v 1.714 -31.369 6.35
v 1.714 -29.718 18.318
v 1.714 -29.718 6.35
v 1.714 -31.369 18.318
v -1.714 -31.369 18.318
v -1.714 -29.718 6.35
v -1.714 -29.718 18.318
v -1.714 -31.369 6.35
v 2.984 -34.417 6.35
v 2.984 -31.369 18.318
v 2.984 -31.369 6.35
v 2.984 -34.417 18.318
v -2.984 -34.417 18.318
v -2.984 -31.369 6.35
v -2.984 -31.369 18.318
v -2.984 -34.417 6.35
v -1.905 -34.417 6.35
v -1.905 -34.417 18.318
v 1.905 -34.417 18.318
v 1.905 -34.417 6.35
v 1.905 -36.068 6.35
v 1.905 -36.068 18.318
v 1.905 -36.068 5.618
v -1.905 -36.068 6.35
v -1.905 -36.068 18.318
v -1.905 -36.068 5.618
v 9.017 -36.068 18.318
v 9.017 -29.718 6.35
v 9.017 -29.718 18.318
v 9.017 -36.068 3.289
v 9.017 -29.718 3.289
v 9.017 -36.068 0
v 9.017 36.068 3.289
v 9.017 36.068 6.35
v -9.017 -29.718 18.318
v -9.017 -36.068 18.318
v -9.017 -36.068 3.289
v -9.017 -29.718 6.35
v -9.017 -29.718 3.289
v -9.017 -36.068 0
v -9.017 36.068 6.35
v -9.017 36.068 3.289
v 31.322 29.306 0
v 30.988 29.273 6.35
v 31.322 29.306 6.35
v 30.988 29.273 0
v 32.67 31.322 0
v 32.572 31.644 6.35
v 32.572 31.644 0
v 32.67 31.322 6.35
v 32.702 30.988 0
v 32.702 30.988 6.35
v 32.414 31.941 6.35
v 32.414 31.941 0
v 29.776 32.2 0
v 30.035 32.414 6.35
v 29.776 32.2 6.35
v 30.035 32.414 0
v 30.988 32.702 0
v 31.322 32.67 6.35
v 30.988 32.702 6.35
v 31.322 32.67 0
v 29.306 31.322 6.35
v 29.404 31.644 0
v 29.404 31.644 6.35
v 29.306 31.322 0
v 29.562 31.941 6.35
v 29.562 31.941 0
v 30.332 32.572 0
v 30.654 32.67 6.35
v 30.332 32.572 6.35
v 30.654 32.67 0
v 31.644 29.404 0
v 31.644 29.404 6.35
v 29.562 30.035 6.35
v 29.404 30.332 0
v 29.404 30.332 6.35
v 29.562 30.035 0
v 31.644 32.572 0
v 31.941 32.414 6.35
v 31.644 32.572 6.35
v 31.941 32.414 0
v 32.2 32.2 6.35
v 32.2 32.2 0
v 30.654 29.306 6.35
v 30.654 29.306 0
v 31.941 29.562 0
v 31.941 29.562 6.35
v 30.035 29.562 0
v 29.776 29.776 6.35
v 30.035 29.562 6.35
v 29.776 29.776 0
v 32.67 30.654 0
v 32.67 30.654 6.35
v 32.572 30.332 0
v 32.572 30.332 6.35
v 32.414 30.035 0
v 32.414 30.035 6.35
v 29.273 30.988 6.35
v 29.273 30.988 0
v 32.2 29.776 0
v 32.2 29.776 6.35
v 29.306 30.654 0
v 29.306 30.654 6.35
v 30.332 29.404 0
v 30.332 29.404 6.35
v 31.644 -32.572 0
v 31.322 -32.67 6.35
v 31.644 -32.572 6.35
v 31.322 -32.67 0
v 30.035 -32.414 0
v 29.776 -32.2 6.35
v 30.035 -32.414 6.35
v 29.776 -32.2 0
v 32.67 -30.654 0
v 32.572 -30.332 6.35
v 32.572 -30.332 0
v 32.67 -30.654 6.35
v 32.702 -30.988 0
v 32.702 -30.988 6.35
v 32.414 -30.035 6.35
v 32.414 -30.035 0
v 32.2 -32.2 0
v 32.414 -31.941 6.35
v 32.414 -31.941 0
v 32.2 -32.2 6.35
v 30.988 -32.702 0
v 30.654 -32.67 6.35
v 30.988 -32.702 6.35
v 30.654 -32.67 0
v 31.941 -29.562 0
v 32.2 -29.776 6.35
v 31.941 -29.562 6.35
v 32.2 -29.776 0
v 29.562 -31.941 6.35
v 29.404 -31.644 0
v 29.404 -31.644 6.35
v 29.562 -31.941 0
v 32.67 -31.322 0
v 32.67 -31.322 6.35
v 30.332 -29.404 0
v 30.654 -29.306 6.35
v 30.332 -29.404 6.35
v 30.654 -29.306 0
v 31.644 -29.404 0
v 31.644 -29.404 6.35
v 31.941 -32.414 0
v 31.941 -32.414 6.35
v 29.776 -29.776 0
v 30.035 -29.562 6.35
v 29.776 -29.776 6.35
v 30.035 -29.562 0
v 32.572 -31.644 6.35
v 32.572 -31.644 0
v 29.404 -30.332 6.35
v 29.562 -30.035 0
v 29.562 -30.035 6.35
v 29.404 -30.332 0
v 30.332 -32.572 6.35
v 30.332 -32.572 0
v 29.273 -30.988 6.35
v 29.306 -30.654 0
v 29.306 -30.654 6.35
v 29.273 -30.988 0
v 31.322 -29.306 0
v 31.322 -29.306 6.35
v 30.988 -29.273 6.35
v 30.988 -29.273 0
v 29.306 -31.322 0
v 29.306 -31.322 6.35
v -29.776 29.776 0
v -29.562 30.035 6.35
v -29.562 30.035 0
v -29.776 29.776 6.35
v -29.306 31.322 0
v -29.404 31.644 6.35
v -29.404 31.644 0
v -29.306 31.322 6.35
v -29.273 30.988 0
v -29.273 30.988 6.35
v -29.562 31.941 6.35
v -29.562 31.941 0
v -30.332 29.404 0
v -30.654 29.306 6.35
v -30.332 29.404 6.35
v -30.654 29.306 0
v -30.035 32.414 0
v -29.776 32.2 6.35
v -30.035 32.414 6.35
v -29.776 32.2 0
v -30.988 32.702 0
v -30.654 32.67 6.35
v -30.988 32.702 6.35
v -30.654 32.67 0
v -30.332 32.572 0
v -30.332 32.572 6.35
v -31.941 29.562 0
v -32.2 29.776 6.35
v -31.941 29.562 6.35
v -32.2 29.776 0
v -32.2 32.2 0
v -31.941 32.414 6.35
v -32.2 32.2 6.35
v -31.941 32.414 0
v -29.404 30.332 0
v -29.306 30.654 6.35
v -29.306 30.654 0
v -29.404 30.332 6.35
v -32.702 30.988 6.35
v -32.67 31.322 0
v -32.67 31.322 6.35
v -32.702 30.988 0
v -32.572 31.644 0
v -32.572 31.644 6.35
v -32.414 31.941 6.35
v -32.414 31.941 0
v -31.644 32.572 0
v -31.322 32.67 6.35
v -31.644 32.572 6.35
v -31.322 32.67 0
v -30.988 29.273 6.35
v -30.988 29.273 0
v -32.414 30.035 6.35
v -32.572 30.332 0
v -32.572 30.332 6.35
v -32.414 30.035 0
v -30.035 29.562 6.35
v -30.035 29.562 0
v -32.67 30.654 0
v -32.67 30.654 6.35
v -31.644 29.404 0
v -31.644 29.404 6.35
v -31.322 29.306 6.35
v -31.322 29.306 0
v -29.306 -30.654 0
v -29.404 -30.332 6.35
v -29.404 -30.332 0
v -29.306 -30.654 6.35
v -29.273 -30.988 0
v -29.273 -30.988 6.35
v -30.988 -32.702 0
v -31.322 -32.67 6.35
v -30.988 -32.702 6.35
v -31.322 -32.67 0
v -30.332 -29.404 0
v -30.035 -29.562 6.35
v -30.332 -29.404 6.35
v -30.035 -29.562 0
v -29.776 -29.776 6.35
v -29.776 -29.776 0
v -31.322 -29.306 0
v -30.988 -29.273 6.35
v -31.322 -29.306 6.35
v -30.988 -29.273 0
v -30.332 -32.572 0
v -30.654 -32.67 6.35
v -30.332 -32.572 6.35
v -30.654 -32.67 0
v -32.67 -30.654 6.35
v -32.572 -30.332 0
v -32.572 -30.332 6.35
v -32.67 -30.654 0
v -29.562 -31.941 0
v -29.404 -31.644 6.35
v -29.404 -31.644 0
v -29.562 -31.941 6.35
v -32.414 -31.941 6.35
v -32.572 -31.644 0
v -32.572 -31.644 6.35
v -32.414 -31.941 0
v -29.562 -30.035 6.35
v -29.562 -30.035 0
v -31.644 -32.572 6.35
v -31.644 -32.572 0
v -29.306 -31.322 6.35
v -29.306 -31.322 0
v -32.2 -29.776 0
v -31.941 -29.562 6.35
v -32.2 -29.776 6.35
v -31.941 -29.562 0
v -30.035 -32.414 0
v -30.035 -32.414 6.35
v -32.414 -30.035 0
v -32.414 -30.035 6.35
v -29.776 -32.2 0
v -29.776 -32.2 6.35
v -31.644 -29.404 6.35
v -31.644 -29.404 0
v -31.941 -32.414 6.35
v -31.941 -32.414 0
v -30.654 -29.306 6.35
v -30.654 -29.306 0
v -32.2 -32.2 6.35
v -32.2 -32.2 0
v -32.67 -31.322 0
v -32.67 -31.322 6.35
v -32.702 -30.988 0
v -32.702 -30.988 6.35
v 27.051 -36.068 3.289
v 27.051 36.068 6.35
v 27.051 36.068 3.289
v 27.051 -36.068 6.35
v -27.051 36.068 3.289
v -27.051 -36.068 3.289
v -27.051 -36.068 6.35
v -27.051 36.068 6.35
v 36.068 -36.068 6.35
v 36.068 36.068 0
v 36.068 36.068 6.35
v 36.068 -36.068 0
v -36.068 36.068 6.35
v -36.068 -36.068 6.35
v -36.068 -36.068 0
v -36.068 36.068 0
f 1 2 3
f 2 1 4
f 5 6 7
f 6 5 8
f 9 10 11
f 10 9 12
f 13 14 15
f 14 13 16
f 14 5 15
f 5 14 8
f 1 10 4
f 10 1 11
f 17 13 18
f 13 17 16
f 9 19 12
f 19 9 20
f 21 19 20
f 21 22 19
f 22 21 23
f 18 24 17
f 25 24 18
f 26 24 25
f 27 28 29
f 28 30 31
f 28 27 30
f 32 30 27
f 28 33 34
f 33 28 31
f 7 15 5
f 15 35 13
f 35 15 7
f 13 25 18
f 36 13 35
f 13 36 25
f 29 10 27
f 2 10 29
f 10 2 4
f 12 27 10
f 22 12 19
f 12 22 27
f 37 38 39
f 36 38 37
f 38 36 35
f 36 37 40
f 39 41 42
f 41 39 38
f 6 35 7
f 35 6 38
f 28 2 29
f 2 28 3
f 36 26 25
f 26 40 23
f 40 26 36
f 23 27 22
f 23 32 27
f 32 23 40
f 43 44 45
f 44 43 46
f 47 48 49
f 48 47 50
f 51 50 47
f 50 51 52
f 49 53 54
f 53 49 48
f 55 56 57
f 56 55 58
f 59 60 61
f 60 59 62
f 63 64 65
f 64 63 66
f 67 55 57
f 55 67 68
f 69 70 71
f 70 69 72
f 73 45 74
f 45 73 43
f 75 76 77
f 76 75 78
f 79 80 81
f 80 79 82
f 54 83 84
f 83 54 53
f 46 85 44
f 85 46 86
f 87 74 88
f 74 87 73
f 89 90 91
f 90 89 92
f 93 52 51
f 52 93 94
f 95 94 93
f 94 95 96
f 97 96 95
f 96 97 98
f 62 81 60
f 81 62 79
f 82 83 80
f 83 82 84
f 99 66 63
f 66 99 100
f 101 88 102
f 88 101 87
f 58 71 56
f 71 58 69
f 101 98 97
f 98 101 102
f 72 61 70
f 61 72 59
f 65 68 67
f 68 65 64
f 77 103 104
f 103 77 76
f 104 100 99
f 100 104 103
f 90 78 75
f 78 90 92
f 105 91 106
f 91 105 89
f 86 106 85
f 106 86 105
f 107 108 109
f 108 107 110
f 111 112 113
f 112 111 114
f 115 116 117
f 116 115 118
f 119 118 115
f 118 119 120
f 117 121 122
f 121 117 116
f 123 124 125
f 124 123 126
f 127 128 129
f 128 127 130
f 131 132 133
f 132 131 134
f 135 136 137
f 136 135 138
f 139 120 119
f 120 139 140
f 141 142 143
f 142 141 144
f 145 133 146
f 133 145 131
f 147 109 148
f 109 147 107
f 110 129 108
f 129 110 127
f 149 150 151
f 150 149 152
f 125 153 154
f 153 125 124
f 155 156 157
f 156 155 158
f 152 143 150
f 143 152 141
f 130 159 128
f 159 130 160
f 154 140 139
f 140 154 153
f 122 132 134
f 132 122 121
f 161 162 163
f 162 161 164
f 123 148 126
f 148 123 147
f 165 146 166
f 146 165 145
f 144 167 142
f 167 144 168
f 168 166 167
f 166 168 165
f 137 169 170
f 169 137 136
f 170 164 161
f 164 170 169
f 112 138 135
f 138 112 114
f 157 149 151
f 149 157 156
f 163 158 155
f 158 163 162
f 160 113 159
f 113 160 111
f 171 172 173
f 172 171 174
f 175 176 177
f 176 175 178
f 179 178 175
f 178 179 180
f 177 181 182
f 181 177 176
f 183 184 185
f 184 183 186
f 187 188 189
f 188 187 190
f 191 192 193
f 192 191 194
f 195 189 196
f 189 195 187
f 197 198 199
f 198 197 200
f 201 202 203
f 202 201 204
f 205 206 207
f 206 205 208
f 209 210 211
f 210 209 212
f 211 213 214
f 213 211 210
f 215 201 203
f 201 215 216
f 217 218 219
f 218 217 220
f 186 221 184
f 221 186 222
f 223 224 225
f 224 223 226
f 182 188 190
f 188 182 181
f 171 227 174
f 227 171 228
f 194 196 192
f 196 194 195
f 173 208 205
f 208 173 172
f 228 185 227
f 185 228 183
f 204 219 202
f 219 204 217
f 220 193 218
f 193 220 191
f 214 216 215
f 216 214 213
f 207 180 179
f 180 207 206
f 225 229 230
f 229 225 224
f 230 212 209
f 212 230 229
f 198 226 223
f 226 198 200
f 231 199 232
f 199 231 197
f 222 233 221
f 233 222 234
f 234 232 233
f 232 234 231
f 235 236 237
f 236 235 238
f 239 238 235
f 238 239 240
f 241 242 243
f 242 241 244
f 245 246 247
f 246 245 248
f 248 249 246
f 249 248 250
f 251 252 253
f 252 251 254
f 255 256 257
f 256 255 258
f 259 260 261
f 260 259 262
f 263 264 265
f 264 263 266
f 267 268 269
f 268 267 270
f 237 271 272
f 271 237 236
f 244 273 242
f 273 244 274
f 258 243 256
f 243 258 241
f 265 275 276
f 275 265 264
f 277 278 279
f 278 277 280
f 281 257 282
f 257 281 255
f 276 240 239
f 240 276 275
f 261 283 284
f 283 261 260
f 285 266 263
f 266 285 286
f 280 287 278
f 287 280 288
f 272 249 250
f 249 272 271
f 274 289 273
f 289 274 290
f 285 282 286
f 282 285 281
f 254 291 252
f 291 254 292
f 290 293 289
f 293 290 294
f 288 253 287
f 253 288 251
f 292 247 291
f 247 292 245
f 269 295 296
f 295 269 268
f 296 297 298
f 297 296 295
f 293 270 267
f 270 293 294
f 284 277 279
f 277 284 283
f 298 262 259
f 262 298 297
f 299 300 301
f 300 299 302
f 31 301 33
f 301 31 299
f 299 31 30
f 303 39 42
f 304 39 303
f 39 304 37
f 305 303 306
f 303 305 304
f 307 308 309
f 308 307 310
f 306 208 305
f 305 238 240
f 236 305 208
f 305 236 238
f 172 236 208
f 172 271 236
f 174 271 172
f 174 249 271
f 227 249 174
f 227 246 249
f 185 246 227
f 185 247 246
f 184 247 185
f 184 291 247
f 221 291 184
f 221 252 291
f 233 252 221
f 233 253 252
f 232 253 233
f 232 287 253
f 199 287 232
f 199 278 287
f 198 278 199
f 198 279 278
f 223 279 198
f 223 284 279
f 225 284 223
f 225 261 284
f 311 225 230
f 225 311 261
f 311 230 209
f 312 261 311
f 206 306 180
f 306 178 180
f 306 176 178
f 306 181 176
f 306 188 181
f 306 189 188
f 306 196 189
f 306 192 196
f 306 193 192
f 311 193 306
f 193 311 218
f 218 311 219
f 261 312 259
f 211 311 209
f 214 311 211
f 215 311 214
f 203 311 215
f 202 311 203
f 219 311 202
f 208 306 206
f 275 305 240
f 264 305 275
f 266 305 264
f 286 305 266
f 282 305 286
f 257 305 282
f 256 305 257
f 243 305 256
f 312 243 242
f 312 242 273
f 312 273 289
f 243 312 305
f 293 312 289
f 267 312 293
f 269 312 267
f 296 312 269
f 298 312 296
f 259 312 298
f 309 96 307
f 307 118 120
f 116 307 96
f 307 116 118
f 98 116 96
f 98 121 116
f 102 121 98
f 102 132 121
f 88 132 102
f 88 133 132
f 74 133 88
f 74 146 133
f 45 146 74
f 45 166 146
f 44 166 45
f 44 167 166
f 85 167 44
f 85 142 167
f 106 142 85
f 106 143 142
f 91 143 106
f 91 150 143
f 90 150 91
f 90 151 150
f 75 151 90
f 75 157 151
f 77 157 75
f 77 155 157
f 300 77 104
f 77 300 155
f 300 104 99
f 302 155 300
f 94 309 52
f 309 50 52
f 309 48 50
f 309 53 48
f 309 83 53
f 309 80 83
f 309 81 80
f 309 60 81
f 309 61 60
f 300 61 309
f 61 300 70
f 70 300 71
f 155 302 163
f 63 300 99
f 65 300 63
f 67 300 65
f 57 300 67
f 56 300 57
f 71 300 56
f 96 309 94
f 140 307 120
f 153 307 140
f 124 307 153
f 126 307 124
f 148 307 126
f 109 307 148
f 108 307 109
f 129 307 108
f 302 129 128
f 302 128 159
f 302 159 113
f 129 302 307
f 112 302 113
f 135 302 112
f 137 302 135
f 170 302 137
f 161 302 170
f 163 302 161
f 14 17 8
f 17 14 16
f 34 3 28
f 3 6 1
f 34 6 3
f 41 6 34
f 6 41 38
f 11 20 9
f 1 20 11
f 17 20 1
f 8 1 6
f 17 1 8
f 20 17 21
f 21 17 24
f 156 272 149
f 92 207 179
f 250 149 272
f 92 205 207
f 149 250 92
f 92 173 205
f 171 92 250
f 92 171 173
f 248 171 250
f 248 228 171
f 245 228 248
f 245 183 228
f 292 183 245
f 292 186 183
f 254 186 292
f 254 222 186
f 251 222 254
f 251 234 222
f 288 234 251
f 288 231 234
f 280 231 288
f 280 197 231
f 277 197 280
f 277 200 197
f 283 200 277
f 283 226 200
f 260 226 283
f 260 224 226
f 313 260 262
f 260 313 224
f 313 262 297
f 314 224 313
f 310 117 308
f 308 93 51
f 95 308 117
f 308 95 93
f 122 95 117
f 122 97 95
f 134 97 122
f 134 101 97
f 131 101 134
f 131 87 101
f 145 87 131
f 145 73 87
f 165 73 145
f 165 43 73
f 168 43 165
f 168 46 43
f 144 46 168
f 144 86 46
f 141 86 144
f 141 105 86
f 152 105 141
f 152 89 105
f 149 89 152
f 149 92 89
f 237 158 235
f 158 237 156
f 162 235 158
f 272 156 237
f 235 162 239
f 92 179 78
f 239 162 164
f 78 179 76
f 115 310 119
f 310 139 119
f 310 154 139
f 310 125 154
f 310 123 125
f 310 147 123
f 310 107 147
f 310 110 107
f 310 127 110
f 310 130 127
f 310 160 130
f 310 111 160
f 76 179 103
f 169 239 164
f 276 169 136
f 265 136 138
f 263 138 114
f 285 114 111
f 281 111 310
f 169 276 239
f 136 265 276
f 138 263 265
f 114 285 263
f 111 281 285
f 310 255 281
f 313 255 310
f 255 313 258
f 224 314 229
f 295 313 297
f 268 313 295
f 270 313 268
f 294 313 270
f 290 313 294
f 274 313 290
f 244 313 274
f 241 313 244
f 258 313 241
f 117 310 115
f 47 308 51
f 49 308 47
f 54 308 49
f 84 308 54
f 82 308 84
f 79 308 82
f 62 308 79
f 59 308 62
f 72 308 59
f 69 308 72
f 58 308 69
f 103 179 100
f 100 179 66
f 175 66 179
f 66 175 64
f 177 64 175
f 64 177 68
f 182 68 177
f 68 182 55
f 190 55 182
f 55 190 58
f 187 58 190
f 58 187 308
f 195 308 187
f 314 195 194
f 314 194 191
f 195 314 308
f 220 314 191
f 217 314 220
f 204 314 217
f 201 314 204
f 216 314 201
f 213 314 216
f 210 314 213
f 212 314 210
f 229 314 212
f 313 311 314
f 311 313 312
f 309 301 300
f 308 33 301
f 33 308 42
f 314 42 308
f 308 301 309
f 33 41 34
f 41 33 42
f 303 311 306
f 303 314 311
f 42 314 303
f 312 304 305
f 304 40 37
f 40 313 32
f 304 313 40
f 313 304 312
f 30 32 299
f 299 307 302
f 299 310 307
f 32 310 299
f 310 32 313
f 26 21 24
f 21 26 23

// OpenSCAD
// file: Common.scad
// All dimensions in inches


$fn=32;

FlaviaOH = 0.185;
FlaviaIH = 0.11;
FlaviaOW = 0.71;
FlaviaIW = 0.55;
FlaviaSlotW = 0.27;
FlaviaMatThick = 0.032;

BaseT = 0.25;
BaseW = FlaviaOW * 4;
// for Test
// BaseL = 0.5;
BaseL = BaseW;



RiserW = BaseW * 0.25;
RiserD = 0.25;
RiserScrewHole = 0.135; // oversize for 0.1285

RiserScrewSlotW = 0.2;
RiserScrewSlotD = 0.2;
RiserScrewHeadDia = 0.25; // panhead 

SlotZ = BaseT - FlaviaOH + FlaviaMatThick;   

TeeH = 1.2 * FlaviaOH; // just to say

// When sitting in slide
SlideHeight = SlotZ + FlaviaMatThick + TeeH + BaseT;
RiserH = SlideHeight * 1.2;
RiserLeadScrewCenter = RiserH - (BaseT * 0.5);
SlideLeadScrewCenter = SlideHeight - (SlotZ + FlaviaMatThick) - (BaseT * 0.5);

SlotSp = FlaviaOW;

// remembering that everything is in inches.  (how embarassing)

Smidge = 0.025; // nearest metric is 0.6 mm.

// The original design said this: 
//   captive nuts need to be a tight (interference) fit in the
//   slot, as the difference between the longest and shortest chord
//   can be quite small (0.030 in the case of a 4-40 nut)
//   Both slot widths will be tight and require an "arbor press."
//   In the absence of an arbor press, one may use a thumb and a
//   coin.
//
// The original design was broken.
//
//   The captive nuts need to float a bit.  The pocket "depth" should
// be a little loose, even though we pay for this with a bit of lash.
//
//   Additionally, the screw head floats in a slot. This allows some
// freedom to align the screw in the base slot with the hole in the slide.
// Dimensional tolerances make lining up the holes between the base riser
// block and the slide platform difficult and fragile.  Small changes in
// printer resolution or the phase of the moon can cause the two holes
// not to line up.  So, the head floats.
// 
NutPocketW4_40 = 0.240;  // captive nut "dia" for 4-40 nut
NutPocketWM3 = 0.210;    // captive nut "dia" for M3 nut

NutPocketDepth = 0.095 + Smidge;

// In places where we need a little bit of play,
// this is our delta 


// The head slot widths need to be just a bit oversized,
// as we'd like most of the friction to be in the anti-lash
// part of the slot.
HeadSlot4_40 = 0.225 + Smidge; // head dia for 4-40 pan head
HeadSlotM3 = 0.21 + Smidge; // head dia for M3 cap screw

// This needs to be a little snug, but not tight.
// The difference in fit amounts to the lash in the
// system.  In general, I'd rather not care, and require
// "one direction only" movement of the slide.  But
// one should never foreclose opportunities for redemption
// (going a little bit too far). 
HeadD4_40 = 0.065 ; // head depth for 4-40 pan head
HeadDM3 = 0.120; // head depth for M3 cap screw

// A driver (either metric 2.5mm or imperial
Shank4_40 = 0.170 ;
ShankM3 = 0.150; // give a little bit for mis-alignment.

MountingHoleOffset = 0.2;
MountingHoleDia = RiserScrewHole;

module ScrewHole() {
  cylinder(d=RiserScrewHole, h = 10, center=true);
}

module MountingHoles() {
  // holes in the base and slide to allow the Y axis base to bolt
  // to the X axis slide
  // four corners.
  X = BaseW * 0.5 - MountingHoleOffset;
  Y = BaseL * 0.5 - MountingHoleOffset;  
  translate([X, Y, 0]) ScrewHole();
  translate([X, -Y, 0]) ScrewHole();  
  translate([-X, Y, 0]) ScrewHole();
  translate([-X, -Y, 0]) ScrewHole();  
}
// main file
include <Common.scad>

module BaseBlock() {
   cube([BaseW, BaseL, BaseT], center=true);
}

module Slot() {
   // a box around a flavia stick
   translate([0, 0, SlotZ]) {
      cube([FlaviaOW, BaseL * 1.1, FlaviaOH], center=true);
   }
}

module ScrewSlot(screw_dia, head_dia, head_depth, driver_dia, height) {
   // cut a slot (rather than a hole) in the riser block
   // to hold the leadscrew.  The leadscrew head will "float"
   // in the Z direction, relative to the slide to relieve
   // binding.
   //
   // There are three parts: the slot for the leadscrew threaded
   // part, the slot for the head, and the slot for the driver.
   //
   // For now, we'll do the metric M3 capscrew
   //
   // This slot is -- subtracted -- from the riser body.
   
   // The screw slot
   translate([0, 0.5 * height, 0]) cube([screw_dia, height, height], center=true);
   // the head slot
   cube([head_dia, head_depth, height], center=true);   
   // the driver slot
   translate([0, -0.5 * height, 0]) cube([driver_dia, height, height], center=true);
}


module RiserBlock() {
   difference() {
     cube([RiserW, RiserD, RiserH], center=true);
     union() {
       translate([0,0,RiserLeadScrewCenter - 0.5 * RiserH]) {
         ScrewSlot(RiserScrewHole, HeadSlotM3, HeadDM3, ShankM3, RiserD * 3);
       }
     }
   }
}

module Base() {
   translate([0,-0.5 * (BaseL - RiserD),0.5 * RiserH])
       RiserBlock();
   translate([0,0,0.5*BaseT])
   difference() {
       BaseBlock();	        
       union() { 
         translate([SlotSp * 1, 0, 0]) Slot();
         translate([-SlotSp * 1, 0, 0]) Slot();
	 MountingHoles();
       }
   }
}

scale([25.4,25.4,25.4]) {
 Base();
}
